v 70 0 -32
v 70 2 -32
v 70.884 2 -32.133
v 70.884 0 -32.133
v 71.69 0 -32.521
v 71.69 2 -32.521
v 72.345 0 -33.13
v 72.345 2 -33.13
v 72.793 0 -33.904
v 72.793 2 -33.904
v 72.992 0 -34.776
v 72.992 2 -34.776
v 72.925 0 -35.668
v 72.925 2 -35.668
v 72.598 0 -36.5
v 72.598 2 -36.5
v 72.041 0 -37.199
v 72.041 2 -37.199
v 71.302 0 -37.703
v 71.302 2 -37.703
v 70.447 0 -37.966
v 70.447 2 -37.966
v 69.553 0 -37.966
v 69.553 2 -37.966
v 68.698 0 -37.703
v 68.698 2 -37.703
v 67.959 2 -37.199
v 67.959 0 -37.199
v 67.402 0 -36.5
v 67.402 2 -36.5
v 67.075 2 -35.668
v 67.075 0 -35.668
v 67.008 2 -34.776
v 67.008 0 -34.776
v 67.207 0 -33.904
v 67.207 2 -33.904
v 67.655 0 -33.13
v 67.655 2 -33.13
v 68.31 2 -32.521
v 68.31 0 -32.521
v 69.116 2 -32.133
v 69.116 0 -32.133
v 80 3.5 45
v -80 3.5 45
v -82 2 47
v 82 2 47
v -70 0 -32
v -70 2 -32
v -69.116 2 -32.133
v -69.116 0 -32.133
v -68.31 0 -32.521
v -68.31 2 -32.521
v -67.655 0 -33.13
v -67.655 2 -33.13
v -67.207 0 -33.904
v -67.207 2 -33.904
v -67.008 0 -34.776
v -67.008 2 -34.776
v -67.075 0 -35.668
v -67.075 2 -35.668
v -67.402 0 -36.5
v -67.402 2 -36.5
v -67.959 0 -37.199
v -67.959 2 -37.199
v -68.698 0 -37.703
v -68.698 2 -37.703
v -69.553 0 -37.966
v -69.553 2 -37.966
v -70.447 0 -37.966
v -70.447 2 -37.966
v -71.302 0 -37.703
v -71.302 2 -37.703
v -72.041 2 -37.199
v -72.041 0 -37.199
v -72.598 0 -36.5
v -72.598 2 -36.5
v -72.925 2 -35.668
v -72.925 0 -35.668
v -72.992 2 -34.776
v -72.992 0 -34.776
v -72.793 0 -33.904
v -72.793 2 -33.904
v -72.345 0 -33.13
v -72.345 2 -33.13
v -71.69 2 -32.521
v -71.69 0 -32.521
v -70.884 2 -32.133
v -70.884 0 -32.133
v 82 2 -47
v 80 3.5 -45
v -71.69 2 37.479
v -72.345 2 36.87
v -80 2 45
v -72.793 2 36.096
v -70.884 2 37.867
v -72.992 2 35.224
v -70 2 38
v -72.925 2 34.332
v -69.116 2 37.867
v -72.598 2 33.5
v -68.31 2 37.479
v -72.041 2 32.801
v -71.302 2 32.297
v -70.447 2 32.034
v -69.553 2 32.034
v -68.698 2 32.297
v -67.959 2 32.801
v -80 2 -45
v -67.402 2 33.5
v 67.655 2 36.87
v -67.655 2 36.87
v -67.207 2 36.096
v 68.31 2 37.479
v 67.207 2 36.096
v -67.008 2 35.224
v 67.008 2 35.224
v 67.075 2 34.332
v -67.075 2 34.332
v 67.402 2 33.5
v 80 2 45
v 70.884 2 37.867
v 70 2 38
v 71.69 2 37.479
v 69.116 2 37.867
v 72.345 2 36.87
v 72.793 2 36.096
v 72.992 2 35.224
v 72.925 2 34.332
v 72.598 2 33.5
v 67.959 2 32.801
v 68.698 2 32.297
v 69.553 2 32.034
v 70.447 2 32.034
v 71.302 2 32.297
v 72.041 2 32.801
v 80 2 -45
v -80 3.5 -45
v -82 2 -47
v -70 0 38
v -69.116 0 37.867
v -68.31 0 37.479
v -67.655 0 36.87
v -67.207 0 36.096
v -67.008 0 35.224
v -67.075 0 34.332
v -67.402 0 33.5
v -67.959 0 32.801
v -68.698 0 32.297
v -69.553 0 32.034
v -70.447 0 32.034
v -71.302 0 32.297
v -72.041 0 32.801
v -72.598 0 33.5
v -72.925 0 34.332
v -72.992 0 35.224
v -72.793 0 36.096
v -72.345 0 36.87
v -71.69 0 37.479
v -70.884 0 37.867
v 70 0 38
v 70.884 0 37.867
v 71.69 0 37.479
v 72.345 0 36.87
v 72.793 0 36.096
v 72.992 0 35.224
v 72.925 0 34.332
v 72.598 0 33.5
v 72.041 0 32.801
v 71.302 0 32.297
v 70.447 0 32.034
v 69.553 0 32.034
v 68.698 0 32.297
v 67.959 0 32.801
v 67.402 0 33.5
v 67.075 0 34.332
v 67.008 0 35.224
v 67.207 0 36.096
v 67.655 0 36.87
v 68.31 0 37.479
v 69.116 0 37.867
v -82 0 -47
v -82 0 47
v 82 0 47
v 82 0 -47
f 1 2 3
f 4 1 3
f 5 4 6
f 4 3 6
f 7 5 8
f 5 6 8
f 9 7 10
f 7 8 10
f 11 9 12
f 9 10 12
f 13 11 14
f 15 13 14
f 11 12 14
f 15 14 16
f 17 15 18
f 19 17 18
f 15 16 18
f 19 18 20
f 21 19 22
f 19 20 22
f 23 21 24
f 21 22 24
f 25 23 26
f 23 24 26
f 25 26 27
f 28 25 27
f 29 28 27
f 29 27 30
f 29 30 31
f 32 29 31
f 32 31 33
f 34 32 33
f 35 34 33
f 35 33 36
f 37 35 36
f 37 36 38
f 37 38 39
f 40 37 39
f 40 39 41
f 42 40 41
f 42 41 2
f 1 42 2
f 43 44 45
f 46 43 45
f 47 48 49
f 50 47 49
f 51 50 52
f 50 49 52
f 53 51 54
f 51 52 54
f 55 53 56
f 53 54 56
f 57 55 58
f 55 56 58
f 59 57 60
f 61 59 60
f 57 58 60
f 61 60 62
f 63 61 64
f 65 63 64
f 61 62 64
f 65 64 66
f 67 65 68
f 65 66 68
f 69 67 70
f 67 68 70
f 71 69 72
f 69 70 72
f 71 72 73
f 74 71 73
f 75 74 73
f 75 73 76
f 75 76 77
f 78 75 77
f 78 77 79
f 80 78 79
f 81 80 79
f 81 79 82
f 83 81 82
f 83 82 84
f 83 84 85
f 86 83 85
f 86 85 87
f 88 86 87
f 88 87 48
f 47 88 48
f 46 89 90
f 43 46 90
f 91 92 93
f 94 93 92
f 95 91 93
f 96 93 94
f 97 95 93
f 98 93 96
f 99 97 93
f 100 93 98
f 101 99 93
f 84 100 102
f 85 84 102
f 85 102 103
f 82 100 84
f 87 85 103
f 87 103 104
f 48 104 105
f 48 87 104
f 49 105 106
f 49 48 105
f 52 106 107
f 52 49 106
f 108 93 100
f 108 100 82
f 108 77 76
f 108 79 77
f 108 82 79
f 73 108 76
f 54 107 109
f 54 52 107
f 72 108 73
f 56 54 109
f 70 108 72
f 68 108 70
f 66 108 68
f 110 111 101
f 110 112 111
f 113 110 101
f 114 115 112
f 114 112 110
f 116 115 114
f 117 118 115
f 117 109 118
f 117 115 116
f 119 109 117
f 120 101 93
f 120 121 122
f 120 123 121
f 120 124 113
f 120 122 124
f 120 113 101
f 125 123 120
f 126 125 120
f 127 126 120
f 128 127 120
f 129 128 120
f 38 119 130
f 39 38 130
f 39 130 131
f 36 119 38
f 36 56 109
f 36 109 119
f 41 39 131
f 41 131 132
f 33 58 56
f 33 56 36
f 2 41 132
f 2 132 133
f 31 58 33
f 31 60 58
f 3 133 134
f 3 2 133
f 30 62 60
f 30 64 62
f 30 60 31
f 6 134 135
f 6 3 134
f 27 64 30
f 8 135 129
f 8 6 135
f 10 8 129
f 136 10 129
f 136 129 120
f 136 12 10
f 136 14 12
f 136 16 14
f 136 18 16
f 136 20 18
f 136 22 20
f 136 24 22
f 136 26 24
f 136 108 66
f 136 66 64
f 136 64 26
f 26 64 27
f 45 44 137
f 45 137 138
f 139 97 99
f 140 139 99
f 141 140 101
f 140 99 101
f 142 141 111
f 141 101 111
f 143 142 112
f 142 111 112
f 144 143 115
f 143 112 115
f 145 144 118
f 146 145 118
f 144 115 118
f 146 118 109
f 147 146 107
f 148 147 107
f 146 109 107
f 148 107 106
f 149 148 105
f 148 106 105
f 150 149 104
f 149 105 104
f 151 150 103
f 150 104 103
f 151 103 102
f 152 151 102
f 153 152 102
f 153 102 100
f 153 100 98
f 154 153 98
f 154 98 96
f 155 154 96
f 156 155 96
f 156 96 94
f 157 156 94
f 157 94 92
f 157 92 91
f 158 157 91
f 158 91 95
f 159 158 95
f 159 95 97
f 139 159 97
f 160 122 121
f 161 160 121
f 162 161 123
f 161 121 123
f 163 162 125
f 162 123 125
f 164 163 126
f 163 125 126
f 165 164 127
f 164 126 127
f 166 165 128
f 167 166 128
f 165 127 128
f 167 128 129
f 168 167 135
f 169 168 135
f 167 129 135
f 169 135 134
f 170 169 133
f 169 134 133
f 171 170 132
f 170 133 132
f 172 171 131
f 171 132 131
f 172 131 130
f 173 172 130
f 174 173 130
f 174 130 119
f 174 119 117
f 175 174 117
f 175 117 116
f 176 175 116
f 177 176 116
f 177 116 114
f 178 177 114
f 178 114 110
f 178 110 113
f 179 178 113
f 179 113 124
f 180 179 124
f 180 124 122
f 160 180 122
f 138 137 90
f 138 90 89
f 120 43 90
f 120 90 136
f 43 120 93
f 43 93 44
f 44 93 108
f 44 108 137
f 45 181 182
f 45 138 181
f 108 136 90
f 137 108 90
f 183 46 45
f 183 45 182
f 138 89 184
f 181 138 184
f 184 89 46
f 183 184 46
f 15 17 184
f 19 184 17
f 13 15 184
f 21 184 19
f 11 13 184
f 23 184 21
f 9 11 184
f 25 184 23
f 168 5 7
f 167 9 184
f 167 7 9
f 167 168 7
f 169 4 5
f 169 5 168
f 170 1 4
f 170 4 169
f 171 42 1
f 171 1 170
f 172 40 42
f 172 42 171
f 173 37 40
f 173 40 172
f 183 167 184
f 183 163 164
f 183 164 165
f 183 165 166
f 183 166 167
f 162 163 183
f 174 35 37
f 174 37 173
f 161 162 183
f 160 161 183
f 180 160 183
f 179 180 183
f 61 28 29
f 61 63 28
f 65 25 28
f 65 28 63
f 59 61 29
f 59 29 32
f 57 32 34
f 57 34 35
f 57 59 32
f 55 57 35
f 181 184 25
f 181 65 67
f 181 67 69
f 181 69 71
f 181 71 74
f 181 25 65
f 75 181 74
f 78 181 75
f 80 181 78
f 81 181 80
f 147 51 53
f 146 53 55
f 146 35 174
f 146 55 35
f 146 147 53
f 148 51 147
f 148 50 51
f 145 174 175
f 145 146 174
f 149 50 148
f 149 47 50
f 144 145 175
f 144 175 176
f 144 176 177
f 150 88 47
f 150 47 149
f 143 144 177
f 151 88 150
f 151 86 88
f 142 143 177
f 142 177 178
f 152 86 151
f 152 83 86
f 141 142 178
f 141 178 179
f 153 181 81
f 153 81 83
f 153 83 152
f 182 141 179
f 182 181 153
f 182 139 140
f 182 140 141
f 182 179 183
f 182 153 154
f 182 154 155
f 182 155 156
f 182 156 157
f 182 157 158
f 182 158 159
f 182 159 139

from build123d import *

# Parameters (mm, degrees)
SKETCH1_W               = 160
SKETCH1_H               = 90
BOSS_EXTRUDE1_DEPTH     = 2
BOSS_EXTRUDE2_DEPTH     = 90
BOSS_EXTRUDE5_DEPTH     = 164
CUT_EXTRUDE1_DEPTH      = 164
CUT_EXTRUDE1_DEPTH_BACK = 164
SKETCH5_R               = 3
CUT_EXTRUDE2_DEPTH      = 164


with BuildPart() as part:
    # Sketch1 → Boss-Extrude1 (new body)
    with BuildSketch(Plane(origin=(0, 0, 0), x_dir=(1, 0, 0), z_dir=(0, 1, 0))):
        Rectangle(SKETCH1_W, SKETCH1_H)
    extrude(amount=BOSS_EXTRUDE1_DEPTH)

    # Sketch2 → Boss-Extrude2 (add)
    with BuildSketch(Plane.XY.offset(45)):
        Polygon((-82, 0), (-80, 0), (-80, 3.5), (-82, 2), align=None)
        Polygon((80, 0), (82, 0), (82, 2), (80, 3.5), align=None)
    extrude(amount=-BOSS_EXTRUDE2_DEPTH)

    # Sketch3 → Boss-Extrude5 (add)
    with BuildSketch(Plane.ZY.offset(82)):
        Polygon((-47, 0), (-45, 0), (-45, 3.5), (-47, 2), align=None)
        Polygon((45, 0), (45, 3.5), (47, 2), (47, 0), align=None)
    extrude(amount=-BOSS_EXTRUDE5_DEPTH)

    # Sketch4 → Cut-Extrude1 (cut, two sides: drawn at the far end of the back side and taken through both)
    with BuildSketch(Plane.XY.offset(-45).offset(-CUT_EXTRUDE1_DEPTH_BACK)):
        Polygon((-80, 3.5), (-82, 2), (-82, 3.5), align=None)
        Polygon((80, 3.5), (82, 3.5), (82, 2), align=None)
    extrude(amount=CUT_EXTRUDE1_DEPTH + CUT_EXTRUDE1_DEPTH_BACK, mode=Mode.SUBTRACT)

    # Sketch5 → Cut-Extrude2 (cut)
    with BuildSketch(Plane(origin=(0, 2, 0), x_dir=(1, 0, 0), z_dir=(0, 1, 0))):
        with Locations(Location((-70, 35, 0), (0, 0, 270))):
            Circle(SKETCH5_R)
        with Locations(Location((70, 35, 0), (0, 0, 270))):
            Circle(SKETCH5_R)
        with Locations(Location((70, -35, 0), (0, 0, 270))):
            Circle(SKETCH5_R)
        with Locations(Location((-70, -35, 0), (0, 0, 270))):
            Circle(SKETCH5_R)
    extrude(amount=-CUT_EXTRUDE2_DEPTH, mode=Mode.SUBTRACT)


solid = part.part
